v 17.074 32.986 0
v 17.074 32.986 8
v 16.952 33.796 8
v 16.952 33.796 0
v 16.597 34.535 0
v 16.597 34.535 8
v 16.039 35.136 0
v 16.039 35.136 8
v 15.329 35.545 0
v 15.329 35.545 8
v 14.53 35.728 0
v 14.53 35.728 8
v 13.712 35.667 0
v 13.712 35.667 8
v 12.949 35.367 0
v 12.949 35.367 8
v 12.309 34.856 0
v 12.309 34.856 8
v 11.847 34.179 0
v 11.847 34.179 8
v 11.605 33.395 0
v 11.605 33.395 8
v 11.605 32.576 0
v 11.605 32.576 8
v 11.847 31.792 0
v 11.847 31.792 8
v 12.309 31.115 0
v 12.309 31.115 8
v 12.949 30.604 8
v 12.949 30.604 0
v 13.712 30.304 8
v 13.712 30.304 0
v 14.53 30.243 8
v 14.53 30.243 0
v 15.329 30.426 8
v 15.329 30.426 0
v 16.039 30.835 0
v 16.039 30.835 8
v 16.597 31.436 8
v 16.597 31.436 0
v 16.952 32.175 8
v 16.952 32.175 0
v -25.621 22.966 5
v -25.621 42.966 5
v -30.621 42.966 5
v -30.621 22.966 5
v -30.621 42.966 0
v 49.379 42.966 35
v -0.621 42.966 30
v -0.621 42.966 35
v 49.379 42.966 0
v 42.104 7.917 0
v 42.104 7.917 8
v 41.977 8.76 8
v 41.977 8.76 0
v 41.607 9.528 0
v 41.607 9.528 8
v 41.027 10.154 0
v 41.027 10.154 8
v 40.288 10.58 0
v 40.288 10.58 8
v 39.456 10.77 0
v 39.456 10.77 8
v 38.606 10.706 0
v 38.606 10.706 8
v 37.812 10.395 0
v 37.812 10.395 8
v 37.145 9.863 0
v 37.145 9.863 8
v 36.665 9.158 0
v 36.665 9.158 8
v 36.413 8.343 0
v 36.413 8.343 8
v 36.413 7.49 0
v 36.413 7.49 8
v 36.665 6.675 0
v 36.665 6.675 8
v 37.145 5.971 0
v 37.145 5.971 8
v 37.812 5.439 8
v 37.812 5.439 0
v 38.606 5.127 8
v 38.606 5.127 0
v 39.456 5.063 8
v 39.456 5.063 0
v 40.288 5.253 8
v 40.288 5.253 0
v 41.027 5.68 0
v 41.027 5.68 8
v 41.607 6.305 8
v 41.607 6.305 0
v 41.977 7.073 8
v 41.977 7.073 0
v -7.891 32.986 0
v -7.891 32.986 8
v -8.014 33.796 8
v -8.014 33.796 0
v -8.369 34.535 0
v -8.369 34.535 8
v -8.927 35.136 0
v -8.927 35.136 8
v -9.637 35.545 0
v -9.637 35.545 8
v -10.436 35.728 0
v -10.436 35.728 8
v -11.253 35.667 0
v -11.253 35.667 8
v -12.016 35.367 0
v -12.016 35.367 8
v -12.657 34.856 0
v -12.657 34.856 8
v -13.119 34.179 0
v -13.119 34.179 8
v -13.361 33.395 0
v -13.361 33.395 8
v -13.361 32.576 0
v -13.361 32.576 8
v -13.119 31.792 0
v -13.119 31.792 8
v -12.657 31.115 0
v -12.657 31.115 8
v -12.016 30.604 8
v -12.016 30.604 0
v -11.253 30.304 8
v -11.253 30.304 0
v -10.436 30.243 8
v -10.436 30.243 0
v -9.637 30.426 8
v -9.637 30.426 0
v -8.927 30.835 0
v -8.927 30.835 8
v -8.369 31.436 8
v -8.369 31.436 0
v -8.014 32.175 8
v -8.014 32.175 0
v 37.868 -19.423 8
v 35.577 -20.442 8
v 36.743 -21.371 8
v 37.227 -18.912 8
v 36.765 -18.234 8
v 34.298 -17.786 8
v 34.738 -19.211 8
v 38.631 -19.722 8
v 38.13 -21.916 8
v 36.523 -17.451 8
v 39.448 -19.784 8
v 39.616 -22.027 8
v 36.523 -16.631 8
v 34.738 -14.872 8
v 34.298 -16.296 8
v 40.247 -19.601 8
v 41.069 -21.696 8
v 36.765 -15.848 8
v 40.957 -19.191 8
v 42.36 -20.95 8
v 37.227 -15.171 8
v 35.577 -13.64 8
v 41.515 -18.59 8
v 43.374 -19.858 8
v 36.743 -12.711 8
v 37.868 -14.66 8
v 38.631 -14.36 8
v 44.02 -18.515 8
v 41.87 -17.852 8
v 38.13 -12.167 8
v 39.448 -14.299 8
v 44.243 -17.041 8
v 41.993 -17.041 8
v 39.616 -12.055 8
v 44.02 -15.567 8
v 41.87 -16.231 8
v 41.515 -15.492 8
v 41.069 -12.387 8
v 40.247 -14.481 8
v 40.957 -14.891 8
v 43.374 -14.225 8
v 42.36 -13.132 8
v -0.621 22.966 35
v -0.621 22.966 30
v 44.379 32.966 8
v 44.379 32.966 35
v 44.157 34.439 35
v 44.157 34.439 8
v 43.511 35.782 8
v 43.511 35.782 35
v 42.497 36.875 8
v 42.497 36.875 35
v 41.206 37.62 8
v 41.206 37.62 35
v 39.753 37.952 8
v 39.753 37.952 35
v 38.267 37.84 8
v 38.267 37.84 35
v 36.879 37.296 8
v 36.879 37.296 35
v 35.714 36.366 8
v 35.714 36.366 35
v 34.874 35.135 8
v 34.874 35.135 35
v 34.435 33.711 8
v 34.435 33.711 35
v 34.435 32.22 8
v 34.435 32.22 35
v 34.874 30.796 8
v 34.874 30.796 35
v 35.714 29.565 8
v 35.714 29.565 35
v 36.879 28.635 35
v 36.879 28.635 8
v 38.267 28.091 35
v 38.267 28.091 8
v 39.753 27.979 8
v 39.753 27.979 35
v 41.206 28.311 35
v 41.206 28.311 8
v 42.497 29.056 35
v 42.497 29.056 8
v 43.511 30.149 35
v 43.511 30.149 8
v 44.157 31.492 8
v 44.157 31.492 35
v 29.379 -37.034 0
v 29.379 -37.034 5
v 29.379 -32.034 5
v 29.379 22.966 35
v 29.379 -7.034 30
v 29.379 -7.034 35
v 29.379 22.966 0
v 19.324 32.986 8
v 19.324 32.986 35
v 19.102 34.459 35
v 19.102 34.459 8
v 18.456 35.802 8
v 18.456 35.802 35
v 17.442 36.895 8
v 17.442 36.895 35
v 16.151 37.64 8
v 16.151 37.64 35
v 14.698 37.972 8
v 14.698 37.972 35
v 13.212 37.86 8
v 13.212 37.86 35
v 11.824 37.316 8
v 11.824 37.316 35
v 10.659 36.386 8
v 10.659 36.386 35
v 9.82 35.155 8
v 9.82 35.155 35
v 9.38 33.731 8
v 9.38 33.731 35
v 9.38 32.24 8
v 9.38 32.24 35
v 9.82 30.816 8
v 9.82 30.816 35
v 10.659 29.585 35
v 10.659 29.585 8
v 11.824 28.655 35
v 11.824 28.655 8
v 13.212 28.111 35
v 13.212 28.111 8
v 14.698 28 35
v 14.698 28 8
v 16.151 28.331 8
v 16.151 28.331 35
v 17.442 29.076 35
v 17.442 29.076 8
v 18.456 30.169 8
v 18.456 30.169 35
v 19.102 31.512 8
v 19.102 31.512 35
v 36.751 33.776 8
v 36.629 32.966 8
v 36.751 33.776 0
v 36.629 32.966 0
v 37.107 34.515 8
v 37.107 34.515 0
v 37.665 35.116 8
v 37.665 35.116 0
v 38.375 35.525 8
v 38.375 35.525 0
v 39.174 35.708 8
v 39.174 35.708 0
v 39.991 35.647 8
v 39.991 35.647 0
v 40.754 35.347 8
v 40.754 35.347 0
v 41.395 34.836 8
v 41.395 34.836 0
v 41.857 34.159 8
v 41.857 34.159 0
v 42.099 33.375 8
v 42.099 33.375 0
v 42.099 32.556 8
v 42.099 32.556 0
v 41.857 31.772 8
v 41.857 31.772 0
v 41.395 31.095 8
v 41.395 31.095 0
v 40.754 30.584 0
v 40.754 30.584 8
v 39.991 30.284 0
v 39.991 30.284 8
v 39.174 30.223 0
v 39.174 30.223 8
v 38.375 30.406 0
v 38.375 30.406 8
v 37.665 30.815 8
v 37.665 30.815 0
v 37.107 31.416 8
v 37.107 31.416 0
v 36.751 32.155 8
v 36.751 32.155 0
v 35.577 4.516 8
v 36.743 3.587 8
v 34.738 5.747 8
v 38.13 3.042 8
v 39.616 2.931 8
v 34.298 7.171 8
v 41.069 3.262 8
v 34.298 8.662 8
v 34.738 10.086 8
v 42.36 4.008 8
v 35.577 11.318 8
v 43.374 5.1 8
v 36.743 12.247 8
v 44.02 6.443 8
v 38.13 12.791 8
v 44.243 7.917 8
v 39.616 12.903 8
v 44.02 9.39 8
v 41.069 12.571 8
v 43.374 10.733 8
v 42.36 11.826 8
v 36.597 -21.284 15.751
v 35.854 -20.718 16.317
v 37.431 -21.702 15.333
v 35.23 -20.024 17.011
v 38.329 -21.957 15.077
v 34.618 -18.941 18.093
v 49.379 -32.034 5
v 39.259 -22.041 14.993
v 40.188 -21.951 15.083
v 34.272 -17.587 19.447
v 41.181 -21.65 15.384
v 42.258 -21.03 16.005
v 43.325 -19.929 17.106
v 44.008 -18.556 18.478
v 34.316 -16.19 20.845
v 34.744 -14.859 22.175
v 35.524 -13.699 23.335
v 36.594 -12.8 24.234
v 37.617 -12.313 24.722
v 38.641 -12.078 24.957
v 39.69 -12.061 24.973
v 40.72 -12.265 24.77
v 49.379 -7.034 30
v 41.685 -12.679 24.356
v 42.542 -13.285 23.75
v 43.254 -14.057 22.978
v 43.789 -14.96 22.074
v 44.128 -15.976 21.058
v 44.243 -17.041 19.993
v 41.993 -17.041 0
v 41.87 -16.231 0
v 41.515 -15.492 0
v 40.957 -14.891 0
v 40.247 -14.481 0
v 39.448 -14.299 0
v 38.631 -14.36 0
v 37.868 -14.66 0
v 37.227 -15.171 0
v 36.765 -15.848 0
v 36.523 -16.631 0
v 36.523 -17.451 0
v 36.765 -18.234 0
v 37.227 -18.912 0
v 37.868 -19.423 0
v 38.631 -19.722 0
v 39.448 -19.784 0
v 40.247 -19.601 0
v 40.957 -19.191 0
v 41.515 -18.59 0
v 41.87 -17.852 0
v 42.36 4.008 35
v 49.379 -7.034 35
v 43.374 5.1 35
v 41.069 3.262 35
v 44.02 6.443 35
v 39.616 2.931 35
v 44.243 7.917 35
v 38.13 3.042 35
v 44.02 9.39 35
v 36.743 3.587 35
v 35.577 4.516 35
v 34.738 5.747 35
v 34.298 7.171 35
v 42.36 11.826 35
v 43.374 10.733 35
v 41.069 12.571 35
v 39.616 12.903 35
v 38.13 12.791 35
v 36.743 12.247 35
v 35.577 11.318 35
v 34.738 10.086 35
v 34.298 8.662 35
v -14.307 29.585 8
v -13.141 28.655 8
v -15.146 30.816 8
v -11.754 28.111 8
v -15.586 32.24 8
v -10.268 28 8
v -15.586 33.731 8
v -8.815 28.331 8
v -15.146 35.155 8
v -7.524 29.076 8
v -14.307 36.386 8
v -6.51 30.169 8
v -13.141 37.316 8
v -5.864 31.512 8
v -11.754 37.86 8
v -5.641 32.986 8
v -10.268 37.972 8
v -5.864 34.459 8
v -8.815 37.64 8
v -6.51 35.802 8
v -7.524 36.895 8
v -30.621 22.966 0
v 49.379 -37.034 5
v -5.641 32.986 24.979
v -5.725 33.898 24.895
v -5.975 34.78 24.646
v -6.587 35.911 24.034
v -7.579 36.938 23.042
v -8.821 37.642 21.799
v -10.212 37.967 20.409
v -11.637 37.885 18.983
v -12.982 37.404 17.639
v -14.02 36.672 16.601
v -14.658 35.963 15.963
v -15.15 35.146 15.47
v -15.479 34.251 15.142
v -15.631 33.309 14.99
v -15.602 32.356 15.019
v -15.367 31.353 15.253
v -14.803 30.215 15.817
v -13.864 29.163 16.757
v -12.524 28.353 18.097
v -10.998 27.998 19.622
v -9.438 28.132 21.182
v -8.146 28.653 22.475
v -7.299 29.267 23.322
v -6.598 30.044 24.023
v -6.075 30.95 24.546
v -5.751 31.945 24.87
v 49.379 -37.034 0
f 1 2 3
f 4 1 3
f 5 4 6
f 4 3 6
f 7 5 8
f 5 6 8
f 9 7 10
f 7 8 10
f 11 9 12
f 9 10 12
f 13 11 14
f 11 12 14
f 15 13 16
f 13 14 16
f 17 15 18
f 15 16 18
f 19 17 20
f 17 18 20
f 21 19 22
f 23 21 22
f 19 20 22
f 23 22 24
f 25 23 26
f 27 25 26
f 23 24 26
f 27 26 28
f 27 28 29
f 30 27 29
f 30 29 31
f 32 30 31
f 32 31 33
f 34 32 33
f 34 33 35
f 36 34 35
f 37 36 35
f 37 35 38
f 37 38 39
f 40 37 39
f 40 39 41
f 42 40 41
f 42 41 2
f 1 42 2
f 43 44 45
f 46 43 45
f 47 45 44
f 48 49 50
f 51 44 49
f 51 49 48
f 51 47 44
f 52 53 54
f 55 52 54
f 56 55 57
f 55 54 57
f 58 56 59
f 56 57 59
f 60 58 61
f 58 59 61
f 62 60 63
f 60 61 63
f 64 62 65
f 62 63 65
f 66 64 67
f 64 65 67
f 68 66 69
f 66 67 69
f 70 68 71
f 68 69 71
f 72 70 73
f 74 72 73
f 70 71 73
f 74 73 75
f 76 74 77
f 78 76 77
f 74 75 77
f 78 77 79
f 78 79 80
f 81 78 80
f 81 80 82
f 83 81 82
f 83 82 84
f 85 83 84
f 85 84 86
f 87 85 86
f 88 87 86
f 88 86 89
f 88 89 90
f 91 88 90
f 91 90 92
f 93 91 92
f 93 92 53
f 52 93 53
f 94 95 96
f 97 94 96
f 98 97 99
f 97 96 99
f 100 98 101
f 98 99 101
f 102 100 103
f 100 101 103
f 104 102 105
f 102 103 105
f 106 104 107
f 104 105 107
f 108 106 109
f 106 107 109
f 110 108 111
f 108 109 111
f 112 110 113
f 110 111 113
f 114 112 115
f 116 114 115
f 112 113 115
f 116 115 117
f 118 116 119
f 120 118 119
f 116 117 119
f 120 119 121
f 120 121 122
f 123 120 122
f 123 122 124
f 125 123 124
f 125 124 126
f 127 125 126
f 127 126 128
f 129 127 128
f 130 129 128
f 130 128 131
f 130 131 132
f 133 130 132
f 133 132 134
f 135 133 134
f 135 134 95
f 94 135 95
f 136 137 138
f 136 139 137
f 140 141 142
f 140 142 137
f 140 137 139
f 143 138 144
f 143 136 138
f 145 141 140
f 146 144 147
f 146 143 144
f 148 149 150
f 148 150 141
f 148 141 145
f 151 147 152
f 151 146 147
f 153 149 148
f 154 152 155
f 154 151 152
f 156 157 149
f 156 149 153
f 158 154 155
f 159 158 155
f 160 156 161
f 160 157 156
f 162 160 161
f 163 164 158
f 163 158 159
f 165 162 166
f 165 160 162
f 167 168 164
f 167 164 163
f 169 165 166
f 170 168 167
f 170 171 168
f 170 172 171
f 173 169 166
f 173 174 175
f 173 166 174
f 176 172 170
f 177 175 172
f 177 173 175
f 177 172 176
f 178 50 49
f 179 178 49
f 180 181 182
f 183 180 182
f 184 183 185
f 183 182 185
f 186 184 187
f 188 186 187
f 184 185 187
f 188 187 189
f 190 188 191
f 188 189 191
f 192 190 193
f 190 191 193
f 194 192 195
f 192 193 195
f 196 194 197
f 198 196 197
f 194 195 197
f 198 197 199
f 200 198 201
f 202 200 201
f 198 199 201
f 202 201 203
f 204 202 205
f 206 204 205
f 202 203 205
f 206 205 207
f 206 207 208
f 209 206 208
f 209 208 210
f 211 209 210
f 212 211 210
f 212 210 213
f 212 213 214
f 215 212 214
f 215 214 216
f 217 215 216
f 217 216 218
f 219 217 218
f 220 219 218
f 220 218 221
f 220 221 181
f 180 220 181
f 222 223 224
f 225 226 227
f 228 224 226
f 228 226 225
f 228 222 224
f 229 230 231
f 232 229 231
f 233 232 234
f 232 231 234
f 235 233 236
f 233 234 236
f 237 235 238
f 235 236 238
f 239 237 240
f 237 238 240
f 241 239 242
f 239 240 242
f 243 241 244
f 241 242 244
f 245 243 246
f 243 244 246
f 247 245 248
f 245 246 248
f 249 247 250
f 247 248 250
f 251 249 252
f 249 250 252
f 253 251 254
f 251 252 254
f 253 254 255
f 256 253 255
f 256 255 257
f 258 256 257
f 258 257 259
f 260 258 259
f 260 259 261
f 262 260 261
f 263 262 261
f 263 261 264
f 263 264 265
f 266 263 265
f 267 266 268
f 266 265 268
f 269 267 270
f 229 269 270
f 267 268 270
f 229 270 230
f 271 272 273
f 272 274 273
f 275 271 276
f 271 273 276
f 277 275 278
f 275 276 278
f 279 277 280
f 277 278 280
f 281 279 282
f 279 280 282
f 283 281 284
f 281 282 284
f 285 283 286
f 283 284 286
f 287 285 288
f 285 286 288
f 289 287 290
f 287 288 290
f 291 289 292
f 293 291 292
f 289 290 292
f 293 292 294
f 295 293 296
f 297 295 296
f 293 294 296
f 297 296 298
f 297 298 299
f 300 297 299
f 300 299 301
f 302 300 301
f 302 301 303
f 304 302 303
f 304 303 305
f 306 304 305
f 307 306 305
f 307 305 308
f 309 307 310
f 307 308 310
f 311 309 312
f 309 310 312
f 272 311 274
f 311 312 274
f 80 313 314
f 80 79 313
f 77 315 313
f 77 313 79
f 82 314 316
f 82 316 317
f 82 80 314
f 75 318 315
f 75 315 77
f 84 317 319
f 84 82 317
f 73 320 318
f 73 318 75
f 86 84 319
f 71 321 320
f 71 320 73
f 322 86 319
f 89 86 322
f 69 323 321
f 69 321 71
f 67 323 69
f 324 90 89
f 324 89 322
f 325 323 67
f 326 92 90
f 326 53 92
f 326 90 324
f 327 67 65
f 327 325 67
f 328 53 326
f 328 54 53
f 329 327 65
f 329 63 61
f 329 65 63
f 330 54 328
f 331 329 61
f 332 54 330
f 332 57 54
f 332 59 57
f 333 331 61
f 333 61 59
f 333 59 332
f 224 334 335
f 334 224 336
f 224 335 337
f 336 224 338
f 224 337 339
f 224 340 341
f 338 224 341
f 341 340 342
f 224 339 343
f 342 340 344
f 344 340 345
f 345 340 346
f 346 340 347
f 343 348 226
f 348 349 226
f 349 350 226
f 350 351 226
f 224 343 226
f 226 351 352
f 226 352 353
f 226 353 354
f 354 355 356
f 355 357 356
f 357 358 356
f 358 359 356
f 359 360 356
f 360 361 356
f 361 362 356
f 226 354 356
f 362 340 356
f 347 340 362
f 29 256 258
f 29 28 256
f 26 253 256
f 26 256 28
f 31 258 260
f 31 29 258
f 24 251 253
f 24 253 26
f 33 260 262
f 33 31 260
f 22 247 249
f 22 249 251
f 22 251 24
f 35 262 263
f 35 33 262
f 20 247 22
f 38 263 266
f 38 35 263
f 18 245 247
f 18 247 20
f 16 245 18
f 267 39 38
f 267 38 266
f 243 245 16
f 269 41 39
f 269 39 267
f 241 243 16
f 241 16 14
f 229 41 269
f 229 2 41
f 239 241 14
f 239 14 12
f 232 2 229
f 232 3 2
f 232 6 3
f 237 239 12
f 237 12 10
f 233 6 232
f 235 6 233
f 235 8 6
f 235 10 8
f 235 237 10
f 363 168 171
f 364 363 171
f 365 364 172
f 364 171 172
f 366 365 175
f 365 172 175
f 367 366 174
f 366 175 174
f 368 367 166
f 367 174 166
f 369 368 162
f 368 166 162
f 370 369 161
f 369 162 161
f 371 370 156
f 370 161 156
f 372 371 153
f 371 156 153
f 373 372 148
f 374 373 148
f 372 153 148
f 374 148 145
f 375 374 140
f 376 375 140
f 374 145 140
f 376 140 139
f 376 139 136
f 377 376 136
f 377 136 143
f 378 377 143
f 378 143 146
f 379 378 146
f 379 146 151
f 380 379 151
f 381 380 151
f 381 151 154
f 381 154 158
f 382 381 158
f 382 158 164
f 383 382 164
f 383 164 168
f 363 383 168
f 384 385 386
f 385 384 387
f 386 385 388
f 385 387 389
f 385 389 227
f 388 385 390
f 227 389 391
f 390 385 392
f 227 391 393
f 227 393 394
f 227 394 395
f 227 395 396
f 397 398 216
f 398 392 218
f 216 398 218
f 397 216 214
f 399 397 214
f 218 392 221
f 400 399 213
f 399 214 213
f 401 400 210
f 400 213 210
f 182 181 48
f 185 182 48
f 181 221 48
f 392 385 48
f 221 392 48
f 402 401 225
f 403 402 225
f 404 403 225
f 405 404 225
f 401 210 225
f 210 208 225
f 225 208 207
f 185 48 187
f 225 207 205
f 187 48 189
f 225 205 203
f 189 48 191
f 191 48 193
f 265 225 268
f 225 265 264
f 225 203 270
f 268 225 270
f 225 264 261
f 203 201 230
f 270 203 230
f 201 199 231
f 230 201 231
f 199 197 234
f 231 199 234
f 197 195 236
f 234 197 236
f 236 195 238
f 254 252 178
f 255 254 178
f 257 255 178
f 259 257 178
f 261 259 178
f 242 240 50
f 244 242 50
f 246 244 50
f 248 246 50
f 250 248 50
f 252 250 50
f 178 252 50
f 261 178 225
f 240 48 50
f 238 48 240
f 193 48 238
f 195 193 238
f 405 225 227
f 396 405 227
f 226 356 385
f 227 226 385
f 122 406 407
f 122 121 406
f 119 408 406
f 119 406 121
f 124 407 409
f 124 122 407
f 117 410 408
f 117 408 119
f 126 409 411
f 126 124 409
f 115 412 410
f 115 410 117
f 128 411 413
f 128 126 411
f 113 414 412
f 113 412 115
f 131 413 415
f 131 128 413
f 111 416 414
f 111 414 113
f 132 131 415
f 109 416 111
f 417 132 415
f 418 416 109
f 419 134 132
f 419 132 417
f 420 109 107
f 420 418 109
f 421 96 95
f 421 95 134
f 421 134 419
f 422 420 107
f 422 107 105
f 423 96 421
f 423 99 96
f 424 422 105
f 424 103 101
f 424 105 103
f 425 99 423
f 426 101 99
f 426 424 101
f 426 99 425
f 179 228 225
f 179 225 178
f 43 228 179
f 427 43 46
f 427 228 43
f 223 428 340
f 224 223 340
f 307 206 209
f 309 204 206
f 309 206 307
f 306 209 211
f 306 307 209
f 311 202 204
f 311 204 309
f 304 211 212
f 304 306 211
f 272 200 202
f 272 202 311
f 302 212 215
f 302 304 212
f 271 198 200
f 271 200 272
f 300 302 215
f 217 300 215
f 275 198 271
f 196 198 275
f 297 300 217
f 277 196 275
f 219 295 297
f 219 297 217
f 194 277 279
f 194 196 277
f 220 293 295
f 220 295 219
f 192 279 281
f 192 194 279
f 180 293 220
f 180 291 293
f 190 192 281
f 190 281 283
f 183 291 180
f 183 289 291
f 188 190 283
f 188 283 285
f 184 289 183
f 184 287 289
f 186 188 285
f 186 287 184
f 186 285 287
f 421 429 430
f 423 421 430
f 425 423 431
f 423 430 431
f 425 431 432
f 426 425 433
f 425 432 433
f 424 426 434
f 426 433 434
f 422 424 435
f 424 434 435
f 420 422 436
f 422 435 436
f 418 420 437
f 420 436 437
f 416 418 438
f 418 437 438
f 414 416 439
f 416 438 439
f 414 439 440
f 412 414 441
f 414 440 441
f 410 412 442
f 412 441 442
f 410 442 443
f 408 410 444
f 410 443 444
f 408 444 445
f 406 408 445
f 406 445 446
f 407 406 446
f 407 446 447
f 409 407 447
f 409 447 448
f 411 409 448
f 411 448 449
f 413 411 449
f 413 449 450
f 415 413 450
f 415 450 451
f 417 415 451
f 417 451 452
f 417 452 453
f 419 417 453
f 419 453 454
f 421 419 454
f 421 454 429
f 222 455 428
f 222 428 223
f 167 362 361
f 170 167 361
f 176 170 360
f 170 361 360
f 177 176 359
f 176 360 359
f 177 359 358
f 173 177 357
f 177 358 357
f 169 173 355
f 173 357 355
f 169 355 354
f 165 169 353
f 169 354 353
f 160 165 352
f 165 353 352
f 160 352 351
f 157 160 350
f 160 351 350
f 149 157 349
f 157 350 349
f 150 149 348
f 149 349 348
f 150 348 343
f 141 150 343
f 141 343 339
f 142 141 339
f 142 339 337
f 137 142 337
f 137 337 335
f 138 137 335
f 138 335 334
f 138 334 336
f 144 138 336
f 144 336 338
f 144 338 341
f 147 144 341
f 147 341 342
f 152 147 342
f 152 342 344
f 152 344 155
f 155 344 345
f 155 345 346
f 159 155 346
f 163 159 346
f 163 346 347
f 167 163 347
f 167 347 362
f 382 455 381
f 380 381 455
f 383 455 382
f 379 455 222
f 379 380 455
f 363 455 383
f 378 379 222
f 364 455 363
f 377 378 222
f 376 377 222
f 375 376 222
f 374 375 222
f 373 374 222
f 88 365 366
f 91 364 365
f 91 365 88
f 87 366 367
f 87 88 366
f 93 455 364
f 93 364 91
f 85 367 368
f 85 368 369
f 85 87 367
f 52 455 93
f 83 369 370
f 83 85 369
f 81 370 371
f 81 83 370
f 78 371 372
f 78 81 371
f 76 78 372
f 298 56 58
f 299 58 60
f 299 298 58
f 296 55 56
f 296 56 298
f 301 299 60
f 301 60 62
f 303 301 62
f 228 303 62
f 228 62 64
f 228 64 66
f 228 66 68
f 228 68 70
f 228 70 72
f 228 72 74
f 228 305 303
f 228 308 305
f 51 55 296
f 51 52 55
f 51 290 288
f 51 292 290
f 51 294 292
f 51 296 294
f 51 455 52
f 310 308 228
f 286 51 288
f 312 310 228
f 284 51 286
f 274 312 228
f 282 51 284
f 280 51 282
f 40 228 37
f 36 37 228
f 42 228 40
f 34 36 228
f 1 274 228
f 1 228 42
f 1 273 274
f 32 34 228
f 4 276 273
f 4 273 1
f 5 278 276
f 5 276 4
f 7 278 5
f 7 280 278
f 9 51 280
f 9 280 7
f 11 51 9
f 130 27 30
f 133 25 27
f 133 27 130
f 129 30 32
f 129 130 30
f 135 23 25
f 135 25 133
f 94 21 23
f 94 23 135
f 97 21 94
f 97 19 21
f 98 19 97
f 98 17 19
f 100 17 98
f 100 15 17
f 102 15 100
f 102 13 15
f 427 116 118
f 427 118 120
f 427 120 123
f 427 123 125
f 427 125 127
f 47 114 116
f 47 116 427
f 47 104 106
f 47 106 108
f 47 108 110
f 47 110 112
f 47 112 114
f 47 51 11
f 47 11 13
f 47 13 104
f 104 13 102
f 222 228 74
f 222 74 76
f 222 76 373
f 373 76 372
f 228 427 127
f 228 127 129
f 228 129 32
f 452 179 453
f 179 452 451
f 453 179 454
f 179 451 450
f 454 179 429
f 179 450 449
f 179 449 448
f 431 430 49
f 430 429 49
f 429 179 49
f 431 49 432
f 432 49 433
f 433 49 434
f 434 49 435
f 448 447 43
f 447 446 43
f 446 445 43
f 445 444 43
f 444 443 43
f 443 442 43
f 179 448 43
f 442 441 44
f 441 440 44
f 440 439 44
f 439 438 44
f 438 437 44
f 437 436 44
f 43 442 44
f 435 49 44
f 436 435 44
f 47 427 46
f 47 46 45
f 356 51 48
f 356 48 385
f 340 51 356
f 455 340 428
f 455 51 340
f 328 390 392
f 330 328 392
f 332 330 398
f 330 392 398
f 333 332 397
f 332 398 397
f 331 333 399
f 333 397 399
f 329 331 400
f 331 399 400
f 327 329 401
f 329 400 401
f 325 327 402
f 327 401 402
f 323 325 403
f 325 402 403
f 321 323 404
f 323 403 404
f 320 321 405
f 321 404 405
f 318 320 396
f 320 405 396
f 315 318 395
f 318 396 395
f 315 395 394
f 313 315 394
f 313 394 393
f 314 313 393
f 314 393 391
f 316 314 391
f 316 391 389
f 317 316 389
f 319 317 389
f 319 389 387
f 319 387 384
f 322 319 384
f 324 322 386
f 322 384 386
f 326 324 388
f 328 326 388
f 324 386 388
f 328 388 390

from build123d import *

# Parameters (mm, degrees)
EXTRUDE_1_DEPTH           = 35
HOLE_WIZARD_1_D           = 5.5
HOLE_WIZARD_1_CBORE_D     = 10
HOLE_WIZARD_1_CBORE_DEPTH = 27
SKETCH_6_R                = 5
SKETCH_6_R_2              = 2.75
SKETCH_6_R_3              = 2.861192155
CUT_EXTRUDE_1_DEPTH       = 27
SKETCH_8_R                = 2.75
SKETCH_8_R_2              = 2.861192155
CUT_EXTRUDE_2_DEPTH       = 35
CUT_EXTRUDE_3_DEPTH       = 35
CUT_EXTRUDE_4_DEPTH       = 35


with BuildPart() as part:
    # 草图1 → 凸台-拉伸1 (new body)
    with BuildSketch(Plane.XY):
        Polygon((-30.620689655, 42.965517241), (49.379310345, 42.965517241), (49.379310345, -37.034482759), (29.379310345, -37.034482759), (29.379310345, 22.965517241), (-30.620689655, 22.965517241), align=None)
    extrude(amount=EXTRUDE_1_DEPTH)

    # 孔1 (through all)
    with Locations(Plane(origin=(39.379310345, 32.965517241, 35), x_dir=(1, 0, 0), z_dir=(0, 0, 1))):
        with Locations((0, 0)):
            CounterBoreHole(HOLE_WIZARD_1_D / 2, HOLE_WIZARD_1_CBORE_D / 2, HOLE_WIZARD_1_CBORE_DEPTH)

    # 草图6 → 切除-拉伸1 (cut)
    with BuildSketch(Plane.XY.offset(35)):
        with Locations((14.324422016, 32.985524686)):
            Circle(SKETCH_6_R)
        with Locations((14.324422016, 32.985524686)):
            Circle(SKETCH_6_R_2, mode=Mode.SUBTRACT)
        with Locations((39.242589892, 7.916677332)):
            Circle(SKETCH_6_R)
        with Locations((39.242589892, 7.916677332)):
            Circle(SKETCH_6_R_3, mode=Mode.SUBTRACT)
        with Locations((39.242589892, -17.041261432)):
            Circle(SKETCH_6_R)
        with Locations((39.242589892, -17.041261432)):
            Circle(SKETCH_6_R_2, mode=Mode.SUBTRACT)
        with Locations((-10.641383775, 32.985524686)):
            Circle(SKETCH_6_R)
        with Locations((-10.641383775, 32.985524686)):
            Circle(SKETCH_6_R_2, mode=Mode.SUBTRACT)
    extrude(amount=-CUT_EXTRUDE_1_DEPTH, mode=Mode.SUBTRACT)

    # 草图8 → 切除-拉伸2 (cut)
    with BuildSketch(Plane.XY.offset(35)):
        with Locations((14.324422016, 32.985524686)):
            Circle(SKETCH_8_R)
        with Locations((39.242589892, 7.916677332)):
            Circle(SKETCH_8_R_2)
        with Locations((39.242589892, -17.041261432)):
            Circle(SKETCH_8_R)
        with Locations((-10.641383775, 32.985524686)):
            Circle(SKETCH_8_R)
    extrude(amount=-CUT_EXTRUDE_2_DEPTH, mode=Mode.SUBTRACT)

    # 草图9 → 切除-拉伸3 (cut)
    with BuildSketch(Plane(origin=(49.379310345, 0, 0), x_dir=(0, 0, -1), z_dir=(1, 0, 0))):
        Polygon((-5, -32.034482759), (-30, -7.034482759), (-35, -7.034482759), (-35, -37.034482759), (-5, -37.034482759), align=None)
    extrude(amount=-CUT_EXTRUDE_3_DEPTH, mode=Mode.SUBTRACT)

    # 草图10 → 切除-拉伸4 (cut)
    with BuildSketch(Plane(origin=(0, 42.965517241, 0), x_dir=(1, 0, 0), z_dir=(0, 1, 0))):
        Polygon((-30.620689655, -35), (-0.620689655, -35), (-0.620689655, -30), (-25.620689655, -5), (-30.620689655, -5), align=None)
    extrude(amount=-CUT_EXTRUDE_4_DEPTH, mode=Mode.SUBTRACT)


solid = part.part
